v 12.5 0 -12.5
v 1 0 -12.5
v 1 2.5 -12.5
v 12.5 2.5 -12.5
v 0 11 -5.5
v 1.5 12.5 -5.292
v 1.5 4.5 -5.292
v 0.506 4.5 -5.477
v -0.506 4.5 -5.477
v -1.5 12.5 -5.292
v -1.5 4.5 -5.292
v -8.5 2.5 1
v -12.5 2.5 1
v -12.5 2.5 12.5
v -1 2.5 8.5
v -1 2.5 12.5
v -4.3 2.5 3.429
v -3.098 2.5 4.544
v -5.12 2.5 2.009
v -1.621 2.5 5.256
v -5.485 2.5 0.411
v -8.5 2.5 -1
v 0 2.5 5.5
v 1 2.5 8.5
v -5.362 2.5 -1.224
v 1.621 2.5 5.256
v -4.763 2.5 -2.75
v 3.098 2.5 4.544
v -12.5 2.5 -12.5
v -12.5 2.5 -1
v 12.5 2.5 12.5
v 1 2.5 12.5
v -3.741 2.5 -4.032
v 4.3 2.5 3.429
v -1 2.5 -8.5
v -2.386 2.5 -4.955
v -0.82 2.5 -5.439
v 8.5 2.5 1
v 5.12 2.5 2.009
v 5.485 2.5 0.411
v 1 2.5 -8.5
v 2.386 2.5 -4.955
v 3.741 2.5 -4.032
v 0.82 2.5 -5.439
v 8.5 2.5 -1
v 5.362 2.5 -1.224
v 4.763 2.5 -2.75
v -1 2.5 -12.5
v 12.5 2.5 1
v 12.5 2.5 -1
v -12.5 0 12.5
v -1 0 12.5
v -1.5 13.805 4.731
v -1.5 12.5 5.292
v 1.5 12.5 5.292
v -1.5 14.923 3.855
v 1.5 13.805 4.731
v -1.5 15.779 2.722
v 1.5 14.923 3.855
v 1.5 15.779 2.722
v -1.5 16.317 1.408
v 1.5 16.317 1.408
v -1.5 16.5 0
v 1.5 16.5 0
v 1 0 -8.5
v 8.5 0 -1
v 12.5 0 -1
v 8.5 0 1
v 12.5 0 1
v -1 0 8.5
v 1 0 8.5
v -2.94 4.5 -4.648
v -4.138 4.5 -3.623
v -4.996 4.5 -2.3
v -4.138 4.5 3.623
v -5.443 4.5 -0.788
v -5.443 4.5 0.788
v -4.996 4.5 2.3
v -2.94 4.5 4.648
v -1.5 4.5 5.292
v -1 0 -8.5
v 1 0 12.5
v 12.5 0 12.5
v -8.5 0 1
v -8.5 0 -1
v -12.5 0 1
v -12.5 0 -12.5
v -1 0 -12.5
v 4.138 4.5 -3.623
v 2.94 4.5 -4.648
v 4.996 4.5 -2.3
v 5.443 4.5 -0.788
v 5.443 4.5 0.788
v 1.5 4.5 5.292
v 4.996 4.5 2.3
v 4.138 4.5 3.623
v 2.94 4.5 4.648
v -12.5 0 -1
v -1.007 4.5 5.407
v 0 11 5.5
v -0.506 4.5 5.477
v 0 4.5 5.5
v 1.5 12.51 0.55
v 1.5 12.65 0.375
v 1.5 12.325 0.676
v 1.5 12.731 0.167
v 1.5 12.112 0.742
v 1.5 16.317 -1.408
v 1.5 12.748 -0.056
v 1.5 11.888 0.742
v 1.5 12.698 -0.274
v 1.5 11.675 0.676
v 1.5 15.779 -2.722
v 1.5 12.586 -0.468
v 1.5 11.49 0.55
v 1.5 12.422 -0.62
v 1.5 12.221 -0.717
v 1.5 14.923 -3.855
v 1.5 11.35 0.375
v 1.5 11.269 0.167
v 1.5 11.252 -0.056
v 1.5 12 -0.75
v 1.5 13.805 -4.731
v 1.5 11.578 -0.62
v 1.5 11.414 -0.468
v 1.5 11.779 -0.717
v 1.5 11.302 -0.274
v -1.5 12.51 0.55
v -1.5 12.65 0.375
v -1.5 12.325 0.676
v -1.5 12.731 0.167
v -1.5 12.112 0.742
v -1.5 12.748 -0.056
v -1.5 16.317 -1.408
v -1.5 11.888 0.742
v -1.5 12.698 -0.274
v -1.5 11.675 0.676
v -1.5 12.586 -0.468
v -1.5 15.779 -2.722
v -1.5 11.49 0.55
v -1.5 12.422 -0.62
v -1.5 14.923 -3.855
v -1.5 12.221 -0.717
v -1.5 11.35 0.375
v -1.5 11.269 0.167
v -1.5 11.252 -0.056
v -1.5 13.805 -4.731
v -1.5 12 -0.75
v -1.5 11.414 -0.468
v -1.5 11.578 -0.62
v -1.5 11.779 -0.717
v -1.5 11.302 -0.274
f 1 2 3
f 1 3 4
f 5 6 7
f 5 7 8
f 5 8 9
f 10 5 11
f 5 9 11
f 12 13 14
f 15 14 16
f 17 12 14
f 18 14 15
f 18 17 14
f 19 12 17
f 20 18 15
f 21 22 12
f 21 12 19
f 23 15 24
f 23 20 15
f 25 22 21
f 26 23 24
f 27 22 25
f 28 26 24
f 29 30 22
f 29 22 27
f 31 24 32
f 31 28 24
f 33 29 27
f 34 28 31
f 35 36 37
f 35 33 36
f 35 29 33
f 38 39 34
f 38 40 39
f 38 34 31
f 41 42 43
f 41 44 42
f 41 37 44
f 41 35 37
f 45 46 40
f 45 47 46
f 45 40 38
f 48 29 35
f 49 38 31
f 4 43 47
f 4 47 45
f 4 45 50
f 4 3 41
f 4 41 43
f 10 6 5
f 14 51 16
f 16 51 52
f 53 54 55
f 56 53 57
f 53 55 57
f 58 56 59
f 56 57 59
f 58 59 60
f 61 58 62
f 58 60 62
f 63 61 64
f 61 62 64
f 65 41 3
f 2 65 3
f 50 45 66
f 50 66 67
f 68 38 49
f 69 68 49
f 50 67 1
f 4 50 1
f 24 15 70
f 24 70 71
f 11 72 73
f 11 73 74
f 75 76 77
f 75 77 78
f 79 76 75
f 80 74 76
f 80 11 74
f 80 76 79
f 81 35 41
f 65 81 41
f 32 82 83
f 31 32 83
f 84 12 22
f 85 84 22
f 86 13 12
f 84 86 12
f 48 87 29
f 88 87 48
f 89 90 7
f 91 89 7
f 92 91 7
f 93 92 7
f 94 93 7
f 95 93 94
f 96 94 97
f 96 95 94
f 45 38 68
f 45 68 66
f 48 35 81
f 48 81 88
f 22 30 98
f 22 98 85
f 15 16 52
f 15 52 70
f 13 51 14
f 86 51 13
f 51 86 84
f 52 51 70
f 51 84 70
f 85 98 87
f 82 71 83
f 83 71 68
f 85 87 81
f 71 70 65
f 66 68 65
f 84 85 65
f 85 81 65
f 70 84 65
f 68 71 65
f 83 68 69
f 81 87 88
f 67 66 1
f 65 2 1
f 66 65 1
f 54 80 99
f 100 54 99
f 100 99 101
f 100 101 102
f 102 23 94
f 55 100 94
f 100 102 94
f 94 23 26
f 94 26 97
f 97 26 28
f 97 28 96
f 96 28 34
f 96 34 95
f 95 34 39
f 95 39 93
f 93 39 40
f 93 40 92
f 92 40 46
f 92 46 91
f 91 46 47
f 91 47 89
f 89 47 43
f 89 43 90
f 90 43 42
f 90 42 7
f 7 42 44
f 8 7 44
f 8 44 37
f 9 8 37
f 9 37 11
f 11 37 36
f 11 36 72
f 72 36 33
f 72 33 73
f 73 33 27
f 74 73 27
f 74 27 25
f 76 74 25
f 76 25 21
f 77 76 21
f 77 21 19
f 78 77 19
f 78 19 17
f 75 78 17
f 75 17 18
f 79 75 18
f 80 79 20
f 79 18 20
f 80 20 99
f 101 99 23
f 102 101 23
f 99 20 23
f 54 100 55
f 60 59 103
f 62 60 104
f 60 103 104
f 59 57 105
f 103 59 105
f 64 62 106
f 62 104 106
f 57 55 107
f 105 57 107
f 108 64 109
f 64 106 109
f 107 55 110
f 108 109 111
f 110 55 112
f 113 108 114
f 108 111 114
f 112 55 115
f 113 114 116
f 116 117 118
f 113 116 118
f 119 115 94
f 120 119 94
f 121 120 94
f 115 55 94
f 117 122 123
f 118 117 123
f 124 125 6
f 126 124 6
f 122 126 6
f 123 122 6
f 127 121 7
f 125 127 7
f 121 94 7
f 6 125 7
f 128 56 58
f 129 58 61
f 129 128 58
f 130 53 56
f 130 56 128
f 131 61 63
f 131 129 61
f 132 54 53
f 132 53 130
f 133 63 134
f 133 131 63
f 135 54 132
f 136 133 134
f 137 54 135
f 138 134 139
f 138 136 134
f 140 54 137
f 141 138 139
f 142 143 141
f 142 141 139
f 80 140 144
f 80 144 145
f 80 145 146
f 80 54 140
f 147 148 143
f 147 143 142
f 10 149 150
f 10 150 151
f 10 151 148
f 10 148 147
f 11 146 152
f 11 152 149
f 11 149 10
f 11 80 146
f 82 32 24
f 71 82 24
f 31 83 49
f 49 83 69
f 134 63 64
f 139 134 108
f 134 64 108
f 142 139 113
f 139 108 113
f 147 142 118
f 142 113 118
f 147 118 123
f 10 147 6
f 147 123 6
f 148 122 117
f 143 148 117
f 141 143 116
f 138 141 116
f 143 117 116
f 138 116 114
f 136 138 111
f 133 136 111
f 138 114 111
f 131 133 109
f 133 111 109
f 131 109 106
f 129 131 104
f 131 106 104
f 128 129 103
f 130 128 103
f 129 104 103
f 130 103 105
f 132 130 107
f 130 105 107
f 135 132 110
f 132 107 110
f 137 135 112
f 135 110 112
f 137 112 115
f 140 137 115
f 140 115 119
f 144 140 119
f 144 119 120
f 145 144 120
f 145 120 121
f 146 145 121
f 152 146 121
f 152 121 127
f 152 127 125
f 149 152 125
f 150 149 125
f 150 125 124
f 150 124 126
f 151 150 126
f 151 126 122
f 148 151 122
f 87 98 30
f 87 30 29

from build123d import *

# Parameters (mm, degrees)
SKETCH1_W           = 25
SKETCH1_H           = 25
BOSS_EXTRUDE1_DEPTH = 2.5
SKETCH2_R           = 5.5
BOSS_EXTRUDE2_DEPTH = 2
BOSS_EXTRUDE3_DEPTH = 12
CUT_EXTRUDE1_DEPTH  = 15
SKETCH6_W           = 2
SKETCH6_H           = 8
SKETCH6_W_2         = 8
SKETCH6_H_2         = 2
CUT_EXTRUDE2_DEPTH  = 15
SKETCH7_R           = 0.75
CUT_EXTRUDE3_DEPTH  = 10


with BuildPart() as part:
    # Sketch1 → Boss-Extrude1 (new body)
    with BuildSketch(Plane(origin=(0, 0, 0), x_dir=(1, 0, 0), z_dir=(0, 1, 0))):
        Rectangle(SKETCH1_W, SKETCH1_H)
    extrude(amount=BOSS_EXTRUDE1_DEPTH)

    # Sketch2 → Boss-Extrude2 (add)
    with BuildSketch(Plane(origin=(0, 2.5, 0), x_dir=(1, 0, 0), z_dir=(0, 1, 0))):
        Circle(SKETCH2_R)
    extrude(amount=BOSS_EXTRUDE2_DEPTH)

    # Sketch3 → Boss-Extrude3 (add)
    with BuildSketch(Plane(origin=(0, 4.5, 0), x_dir=(1, 0, 0), z_dir=(0, 1, 0))):
        with BuildLine():
            ThreePointArc((1.5, 5.291502622), (0, 5.5), (-1.5, 5.291502622))
            Line((-1.5, 5.291502622), (-1.5, -5.291502622))
            ThreePointArc((-1.5, -5.291502622), (0, -5.5), (1.5, -5.291502622))
            Line((1.5, -5.291502622), (1.5, 5.291502622))
        make_face()
    extrude(amount=BOSS_EXTRUDE3_DEPTH)

    # Sketch4 → Cut-Extrude1 (cut)
    with BuildSketch(Plane(origin=(1.5, 0, 0), x_dir=(0, 0, -1), z_dir=(1, 0, 0))):
        with BuildLine():
            Line((-5.5, 17.101407095), (-5.5, 11))
            ThreePointArc((-5.5, 11), (0, 16.5), (5.5, 11))
            Line((5.5, 11), (5.5, 17.101407095))
            Line((5.5, 17.101407095), (-5.5, 17.101407095))
        make_face()
    extrude(amount=-CUT_EXTRUDE1_DEPTH, mode=Mode.SUBTRACT)

    # Sketch6 → Cut-Extrude2 (cut)
    with BuildSketch(Plane(origin=(0, 2.5, 0), x_dir=(1, 0, 0), z_dir=(0, 1, 0))):
        with Locations((0, 12.5)):
            Rectangle(SKETCH6_W, SKETCH6_H)
        with Locations((0, -12.5)):
            Rectangle(SKETCH6_W, SKETCH6_H)
        with Locations((12.5, 0)):
            Rectangle(SKETCH6_W_2, SKETCH6_H_2)
        with Locations((-12.5, 0)):
            Rectangle(SKETCH6_W_2, SKETCH6_H_2)
    extrude(amount=-CUT_EXTRUDE2_DEPTH, mode=Mode.SUBTRACT)

    # Sketch7 → Cut-Extrude3 (cut)
    with BuildSketch(Plane(origin=(1.5, 0, 0), x_dir=(0, 0, -1), z_dir=(1, 0, 0))):
        with Locations((0, 12)):
            Circle(SKETCH7_R)
    extrude(amount=-CUT_EXTRUDE3_DEPTH, mode=Mode.SUBTRACT)


solid = part.part
